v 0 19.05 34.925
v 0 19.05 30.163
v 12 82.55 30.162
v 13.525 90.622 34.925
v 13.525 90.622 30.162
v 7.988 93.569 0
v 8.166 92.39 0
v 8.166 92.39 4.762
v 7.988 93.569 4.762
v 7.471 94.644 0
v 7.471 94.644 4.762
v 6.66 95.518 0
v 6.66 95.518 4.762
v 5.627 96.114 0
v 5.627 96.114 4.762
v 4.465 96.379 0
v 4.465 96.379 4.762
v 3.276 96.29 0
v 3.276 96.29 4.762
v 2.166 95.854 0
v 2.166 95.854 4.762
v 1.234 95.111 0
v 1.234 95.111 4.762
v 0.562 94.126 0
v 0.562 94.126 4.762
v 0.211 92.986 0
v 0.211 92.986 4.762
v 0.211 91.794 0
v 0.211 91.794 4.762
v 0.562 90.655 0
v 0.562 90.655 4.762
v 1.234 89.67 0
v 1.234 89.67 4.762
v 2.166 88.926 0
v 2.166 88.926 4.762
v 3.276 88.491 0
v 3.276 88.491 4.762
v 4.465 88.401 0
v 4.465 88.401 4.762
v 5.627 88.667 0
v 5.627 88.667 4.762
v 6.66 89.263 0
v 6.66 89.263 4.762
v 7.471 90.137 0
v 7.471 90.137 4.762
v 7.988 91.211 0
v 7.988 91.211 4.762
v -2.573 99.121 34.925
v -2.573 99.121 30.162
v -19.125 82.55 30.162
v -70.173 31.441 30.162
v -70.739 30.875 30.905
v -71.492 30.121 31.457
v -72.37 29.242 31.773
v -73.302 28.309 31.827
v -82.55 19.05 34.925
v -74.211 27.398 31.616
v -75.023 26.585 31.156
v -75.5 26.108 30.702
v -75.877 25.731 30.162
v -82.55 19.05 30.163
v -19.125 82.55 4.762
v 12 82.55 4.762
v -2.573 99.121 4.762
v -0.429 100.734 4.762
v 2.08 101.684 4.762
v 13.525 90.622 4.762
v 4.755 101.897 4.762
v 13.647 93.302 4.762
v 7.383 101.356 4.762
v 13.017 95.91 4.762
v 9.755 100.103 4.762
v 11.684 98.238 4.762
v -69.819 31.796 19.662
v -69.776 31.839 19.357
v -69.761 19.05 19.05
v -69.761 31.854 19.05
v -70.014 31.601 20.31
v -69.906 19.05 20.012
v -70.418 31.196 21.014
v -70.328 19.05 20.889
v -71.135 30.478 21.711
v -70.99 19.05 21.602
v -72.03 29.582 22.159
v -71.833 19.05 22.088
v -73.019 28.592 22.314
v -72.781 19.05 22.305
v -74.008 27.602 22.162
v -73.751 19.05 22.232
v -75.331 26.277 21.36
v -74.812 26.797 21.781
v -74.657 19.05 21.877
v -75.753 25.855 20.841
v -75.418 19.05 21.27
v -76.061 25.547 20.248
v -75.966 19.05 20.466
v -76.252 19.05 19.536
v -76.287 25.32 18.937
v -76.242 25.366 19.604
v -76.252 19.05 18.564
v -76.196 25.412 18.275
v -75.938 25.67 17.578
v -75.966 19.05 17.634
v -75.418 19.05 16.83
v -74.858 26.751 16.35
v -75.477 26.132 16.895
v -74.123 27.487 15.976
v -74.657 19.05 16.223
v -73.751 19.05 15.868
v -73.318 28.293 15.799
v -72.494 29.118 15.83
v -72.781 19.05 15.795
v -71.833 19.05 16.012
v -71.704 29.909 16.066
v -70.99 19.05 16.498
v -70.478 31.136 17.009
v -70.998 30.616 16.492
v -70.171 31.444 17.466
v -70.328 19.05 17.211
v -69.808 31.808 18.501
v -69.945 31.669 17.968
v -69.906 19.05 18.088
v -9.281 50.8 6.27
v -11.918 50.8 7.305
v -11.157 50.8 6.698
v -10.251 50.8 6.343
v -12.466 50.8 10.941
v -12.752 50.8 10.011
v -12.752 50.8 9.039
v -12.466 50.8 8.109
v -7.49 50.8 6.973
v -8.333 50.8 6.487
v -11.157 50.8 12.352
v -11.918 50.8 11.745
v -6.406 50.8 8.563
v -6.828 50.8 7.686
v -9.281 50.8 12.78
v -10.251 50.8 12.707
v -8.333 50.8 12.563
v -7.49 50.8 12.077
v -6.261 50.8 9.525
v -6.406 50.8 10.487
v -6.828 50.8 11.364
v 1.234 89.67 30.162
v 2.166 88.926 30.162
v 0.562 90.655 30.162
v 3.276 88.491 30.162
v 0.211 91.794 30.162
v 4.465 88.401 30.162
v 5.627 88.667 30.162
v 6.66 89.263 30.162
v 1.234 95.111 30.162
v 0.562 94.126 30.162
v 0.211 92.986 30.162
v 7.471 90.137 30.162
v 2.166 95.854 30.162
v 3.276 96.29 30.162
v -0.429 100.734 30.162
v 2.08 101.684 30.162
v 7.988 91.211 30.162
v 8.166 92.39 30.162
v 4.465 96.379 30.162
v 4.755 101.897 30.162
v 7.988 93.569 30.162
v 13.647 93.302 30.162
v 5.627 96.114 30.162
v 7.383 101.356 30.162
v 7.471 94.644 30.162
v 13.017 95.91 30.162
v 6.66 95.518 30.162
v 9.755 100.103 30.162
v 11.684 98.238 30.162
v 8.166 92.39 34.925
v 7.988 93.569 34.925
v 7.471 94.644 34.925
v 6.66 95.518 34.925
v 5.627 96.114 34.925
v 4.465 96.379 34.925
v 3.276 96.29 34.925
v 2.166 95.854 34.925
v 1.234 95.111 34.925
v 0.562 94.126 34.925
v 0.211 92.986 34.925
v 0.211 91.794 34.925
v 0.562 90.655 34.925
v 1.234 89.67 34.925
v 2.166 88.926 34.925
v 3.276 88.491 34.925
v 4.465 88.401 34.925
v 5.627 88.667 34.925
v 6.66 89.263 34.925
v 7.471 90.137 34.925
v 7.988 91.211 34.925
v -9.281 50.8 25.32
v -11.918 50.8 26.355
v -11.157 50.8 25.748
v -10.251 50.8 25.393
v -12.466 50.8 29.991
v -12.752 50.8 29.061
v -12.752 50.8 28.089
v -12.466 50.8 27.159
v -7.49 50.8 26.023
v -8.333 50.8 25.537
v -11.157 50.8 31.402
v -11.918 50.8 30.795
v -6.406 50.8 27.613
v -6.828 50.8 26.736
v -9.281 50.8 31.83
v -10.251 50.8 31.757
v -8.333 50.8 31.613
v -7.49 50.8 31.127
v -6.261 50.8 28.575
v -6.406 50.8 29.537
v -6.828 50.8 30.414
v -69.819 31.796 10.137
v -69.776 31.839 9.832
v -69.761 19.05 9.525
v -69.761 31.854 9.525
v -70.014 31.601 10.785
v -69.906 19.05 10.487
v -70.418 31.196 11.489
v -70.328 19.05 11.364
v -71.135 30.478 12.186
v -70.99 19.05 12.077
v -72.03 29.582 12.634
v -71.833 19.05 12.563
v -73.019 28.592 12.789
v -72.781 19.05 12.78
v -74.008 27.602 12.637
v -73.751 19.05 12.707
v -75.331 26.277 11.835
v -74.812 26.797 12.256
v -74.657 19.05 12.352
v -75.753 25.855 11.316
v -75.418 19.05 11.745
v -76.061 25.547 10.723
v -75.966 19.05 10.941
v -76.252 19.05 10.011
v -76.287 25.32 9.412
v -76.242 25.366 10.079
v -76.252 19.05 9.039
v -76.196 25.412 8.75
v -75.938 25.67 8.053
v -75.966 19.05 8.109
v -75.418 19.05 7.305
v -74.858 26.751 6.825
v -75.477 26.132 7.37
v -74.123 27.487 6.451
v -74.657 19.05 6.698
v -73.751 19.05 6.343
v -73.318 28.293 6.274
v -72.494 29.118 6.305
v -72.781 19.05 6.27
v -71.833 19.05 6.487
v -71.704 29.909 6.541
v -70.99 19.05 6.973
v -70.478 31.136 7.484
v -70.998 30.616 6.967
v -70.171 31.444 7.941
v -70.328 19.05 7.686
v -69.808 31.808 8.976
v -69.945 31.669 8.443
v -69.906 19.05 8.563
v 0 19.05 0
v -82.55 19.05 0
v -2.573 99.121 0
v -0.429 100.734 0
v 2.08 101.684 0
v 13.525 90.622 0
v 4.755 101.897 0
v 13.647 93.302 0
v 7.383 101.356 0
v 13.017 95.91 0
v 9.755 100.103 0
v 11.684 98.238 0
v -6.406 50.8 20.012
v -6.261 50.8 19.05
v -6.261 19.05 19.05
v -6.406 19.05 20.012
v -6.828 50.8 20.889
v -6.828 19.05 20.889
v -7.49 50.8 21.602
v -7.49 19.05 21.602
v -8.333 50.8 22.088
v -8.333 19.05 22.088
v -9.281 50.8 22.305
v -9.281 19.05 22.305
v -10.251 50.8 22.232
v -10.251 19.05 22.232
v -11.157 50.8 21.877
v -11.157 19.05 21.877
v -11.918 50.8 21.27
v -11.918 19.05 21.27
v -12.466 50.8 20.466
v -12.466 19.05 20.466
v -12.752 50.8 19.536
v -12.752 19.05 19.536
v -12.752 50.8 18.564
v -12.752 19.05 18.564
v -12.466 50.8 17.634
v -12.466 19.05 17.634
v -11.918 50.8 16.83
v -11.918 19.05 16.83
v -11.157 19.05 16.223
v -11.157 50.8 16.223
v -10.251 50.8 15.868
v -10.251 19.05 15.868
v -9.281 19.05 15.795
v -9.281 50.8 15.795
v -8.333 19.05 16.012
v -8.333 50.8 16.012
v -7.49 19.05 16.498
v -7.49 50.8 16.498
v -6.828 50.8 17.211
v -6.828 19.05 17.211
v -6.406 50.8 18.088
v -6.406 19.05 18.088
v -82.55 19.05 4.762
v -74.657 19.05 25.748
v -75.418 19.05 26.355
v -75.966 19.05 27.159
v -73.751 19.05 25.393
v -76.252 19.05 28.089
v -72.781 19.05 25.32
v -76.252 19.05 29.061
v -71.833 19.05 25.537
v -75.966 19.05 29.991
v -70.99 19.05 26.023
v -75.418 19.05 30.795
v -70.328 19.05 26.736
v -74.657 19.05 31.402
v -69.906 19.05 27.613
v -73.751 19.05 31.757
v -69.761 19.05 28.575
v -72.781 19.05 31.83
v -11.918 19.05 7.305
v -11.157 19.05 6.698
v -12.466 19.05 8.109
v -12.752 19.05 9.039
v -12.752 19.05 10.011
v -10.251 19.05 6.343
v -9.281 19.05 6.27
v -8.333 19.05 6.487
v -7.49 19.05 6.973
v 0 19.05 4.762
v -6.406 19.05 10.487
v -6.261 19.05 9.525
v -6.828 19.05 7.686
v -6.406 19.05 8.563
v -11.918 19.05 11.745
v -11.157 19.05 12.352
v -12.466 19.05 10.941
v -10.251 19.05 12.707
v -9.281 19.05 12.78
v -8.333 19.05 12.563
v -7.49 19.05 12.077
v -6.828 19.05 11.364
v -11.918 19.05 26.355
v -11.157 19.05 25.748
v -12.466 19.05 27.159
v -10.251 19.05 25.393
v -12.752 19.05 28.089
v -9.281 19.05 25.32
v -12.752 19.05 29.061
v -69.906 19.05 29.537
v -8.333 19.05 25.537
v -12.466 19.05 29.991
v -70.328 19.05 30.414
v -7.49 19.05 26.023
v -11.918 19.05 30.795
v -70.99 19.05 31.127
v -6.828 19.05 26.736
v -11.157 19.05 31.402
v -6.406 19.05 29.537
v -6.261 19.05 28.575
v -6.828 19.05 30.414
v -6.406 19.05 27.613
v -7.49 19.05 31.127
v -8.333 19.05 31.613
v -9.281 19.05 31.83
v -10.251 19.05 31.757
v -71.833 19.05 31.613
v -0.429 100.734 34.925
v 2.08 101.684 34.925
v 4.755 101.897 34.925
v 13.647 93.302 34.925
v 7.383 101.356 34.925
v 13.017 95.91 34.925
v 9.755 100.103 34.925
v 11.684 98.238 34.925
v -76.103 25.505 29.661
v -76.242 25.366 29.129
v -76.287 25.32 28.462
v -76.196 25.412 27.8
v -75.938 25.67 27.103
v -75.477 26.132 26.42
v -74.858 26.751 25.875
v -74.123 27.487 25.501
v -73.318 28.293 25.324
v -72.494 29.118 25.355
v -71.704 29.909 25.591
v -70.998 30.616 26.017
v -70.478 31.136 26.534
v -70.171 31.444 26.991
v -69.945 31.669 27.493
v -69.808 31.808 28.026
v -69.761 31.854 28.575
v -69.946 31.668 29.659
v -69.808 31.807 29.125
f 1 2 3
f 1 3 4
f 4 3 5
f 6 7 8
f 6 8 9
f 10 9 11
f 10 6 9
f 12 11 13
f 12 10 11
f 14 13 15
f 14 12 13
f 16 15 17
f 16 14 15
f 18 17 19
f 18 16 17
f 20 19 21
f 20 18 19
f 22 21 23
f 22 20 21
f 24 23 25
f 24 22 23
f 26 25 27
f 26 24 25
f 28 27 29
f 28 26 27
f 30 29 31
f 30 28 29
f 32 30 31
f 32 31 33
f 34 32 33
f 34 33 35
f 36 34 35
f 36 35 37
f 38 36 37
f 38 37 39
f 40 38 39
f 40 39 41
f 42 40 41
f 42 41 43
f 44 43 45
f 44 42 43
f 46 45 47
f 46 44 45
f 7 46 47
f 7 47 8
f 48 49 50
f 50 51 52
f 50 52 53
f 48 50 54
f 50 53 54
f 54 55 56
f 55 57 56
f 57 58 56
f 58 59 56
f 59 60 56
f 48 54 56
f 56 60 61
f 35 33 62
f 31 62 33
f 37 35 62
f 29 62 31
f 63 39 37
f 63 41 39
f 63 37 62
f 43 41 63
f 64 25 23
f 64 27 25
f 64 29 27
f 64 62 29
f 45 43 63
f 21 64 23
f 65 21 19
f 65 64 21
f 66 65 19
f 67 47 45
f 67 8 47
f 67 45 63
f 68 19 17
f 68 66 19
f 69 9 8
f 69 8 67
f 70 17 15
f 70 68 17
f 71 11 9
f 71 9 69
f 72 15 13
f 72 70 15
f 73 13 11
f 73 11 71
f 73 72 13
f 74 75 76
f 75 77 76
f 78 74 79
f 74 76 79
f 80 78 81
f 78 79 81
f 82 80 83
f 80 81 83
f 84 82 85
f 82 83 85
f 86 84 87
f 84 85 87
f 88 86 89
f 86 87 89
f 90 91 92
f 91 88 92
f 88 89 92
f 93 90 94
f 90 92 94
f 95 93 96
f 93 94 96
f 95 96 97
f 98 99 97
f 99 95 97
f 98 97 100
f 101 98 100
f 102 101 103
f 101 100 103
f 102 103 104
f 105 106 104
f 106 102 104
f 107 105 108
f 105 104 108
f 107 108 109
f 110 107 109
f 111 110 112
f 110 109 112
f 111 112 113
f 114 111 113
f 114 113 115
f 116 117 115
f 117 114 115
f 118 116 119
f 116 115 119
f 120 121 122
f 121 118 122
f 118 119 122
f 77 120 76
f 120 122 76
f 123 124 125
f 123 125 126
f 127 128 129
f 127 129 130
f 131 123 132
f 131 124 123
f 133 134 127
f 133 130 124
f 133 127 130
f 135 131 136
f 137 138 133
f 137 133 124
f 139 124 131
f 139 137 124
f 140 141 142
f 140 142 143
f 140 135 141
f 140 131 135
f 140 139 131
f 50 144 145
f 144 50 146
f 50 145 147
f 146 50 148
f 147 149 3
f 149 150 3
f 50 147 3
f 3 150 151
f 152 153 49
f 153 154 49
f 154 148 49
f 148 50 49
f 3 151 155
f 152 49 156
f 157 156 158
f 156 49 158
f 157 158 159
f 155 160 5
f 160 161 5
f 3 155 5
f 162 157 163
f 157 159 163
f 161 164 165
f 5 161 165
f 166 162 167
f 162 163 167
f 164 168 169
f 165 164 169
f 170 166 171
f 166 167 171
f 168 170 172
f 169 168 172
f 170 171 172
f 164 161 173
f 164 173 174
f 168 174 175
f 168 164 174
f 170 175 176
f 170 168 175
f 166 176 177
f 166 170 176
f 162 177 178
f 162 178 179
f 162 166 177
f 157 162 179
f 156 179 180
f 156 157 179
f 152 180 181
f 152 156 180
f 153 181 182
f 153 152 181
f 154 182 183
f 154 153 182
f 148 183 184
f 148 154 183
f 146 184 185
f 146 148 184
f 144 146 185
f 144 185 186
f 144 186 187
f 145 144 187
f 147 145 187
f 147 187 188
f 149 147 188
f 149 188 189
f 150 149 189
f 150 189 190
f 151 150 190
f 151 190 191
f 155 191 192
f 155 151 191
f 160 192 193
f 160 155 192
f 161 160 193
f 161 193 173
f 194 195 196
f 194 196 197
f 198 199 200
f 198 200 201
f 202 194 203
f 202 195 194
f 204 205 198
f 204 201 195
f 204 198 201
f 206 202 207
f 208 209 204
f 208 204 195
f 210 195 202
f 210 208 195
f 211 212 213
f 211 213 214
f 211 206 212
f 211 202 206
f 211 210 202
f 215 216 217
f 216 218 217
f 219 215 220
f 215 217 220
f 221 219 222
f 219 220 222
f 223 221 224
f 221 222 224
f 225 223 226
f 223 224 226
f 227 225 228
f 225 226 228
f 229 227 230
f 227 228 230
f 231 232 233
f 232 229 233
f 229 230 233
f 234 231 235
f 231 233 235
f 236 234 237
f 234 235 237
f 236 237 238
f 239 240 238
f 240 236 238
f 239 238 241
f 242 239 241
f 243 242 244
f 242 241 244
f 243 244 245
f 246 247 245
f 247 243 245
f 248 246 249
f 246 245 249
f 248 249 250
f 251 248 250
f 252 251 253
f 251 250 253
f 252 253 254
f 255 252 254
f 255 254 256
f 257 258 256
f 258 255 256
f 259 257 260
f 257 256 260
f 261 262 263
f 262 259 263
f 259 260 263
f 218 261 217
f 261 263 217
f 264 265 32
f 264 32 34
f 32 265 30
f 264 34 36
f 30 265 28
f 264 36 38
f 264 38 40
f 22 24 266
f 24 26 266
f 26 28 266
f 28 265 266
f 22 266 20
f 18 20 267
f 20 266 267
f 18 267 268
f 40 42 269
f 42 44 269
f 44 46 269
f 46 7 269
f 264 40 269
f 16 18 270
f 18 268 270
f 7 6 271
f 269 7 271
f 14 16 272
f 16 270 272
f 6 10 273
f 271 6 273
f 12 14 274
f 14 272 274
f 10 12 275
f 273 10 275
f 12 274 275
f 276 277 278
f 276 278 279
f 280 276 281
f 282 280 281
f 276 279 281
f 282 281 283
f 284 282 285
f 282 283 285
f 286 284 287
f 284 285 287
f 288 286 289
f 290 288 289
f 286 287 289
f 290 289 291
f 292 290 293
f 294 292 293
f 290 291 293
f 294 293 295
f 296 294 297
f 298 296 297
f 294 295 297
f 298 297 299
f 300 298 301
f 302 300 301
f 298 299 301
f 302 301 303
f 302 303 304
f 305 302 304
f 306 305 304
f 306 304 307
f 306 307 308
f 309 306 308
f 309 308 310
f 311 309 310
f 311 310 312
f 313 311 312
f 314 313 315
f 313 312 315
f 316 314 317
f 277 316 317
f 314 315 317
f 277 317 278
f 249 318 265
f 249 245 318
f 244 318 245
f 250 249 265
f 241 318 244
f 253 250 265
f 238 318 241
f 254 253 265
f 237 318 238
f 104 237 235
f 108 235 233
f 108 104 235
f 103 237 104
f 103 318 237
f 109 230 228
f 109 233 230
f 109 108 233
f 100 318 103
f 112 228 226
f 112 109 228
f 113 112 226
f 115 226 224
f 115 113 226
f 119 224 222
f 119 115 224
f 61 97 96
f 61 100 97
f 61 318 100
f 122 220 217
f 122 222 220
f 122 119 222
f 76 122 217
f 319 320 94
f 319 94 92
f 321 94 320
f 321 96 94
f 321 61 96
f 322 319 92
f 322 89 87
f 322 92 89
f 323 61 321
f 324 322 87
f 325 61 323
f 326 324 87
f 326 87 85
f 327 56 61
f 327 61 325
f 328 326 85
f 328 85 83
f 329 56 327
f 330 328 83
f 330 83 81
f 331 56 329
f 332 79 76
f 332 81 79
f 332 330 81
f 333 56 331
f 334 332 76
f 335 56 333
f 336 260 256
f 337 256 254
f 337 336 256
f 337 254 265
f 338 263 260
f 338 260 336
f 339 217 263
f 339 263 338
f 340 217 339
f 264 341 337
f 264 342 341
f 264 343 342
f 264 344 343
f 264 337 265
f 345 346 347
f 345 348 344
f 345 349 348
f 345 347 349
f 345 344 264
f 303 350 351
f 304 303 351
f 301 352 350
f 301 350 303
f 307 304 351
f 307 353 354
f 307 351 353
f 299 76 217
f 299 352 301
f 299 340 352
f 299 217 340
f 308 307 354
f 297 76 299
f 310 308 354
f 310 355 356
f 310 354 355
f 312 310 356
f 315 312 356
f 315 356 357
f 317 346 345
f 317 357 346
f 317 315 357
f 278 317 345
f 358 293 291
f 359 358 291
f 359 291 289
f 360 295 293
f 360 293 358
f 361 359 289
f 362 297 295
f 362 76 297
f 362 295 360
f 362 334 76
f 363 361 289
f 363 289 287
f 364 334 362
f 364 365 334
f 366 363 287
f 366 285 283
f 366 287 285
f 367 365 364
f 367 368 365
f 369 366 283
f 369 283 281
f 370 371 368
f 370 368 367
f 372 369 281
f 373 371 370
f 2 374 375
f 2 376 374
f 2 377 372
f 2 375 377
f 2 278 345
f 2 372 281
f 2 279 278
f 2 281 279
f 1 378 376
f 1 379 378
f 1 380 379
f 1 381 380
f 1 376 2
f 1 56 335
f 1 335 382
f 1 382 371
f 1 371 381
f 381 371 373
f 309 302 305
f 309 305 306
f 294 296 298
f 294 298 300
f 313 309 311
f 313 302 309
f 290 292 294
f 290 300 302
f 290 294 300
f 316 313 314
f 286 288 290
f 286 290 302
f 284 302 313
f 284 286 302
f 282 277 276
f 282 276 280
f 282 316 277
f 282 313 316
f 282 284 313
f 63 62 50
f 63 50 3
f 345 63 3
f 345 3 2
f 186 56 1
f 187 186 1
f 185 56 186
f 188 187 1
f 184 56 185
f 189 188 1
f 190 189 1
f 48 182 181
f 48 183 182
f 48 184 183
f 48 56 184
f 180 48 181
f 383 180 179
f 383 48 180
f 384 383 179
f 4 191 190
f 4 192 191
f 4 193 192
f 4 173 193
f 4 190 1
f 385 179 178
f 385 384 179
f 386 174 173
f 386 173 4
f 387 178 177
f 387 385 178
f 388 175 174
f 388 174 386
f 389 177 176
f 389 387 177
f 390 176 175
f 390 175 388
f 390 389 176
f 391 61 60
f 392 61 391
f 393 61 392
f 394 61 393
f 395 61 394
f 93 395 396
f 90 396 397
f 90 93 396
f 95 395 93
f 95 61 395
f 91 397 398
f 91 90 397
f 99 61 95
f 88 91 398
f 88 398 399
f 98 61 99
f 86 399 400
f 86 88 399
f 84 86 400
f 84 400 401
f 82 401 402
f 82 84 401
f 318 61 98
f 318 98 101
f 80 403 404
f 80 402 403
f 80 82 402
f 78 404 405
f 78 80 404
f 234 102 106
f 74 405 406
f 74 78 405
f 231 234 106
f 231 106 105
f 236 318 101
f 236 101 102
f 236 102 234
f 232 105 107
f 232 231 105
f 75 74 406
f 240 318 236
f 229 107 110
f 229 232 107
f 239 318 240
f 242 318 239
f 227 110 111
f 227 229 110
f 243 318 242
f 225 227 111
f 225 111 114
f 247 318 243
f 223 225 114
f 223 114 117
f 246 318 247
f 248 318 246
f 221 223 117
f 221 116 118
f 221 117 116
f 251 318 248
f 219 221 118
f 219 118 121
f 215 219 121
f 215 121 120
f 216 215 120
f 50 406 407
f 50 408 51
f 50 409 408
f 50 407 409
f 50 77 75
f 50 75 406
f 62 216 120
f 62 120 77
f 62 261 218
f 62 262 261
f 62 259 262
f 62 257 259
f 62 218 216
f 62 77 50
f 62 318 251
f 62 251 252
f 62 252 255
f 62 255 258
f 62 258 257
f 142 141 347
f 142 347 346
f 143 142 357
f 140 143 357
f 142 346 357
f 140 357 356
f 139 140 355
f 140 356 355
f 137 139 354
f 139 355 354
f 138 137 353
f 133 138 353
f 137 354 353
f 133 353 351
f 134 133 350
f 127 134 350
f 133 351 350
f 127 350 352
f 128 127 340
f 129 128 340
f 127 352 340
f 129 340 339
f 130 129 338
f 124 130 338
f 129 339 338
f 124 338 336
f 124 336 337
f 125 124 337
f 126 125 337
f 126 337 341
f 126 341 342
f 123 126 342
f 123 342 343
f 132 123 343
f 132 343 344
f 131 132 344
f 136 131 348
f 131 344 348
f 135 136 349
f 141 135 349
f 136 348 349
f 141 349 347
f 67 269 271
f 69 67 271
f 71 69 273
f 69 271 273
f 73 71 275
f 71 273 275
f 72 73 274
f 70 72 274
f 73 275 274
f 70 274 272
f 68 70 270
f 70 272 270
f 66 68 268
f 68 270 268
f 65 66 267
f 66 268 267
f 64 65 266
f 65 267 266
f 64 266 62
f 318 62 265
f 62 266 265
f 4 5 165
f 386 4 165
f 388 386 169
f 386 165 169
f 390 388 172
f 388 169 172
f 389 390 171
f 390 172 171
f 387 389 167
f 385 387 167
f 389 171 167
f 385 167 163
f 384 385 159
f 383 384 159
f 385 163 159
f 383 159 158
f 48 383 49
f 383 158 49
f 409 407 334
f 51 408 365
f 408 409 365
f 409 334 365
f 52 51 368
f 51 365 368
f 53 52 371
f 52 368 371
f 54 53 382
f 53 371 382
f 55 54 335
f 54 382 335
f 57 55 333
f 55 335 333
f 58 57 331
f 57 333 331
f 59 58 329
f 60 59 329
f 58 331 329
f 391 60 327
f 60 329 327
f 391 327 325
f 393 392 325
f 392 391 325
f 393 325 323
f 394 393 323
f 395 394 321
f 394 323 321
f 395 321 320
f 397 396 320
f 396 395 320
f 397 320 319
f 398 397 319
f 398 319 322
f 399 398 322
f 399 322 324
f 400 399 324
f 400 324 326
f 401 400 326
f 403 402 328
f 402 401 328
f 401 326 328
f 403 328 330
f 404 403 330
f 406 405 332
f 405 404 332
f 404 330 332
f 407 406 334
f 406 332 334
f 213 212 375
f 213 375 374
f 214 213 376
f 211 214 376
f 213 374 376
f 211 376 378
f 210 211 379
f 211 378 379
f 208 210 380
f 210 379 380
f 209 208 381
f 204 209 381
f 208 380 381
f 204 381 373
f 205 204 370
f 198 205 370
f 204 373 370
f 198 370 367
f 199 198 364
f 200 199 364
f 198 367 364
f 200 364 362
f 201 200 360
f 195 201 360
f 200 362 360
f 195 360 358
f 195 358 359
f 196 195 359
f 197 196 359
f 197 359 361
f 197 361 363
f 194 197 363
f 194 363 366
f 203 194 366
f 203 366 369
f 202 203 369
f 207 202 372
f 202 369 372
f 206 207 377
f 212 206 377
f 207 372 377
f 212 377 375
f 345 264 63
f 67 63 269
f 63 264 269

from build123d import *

# Parameters (mm, degrees)
SKETCH1_R           = 4
BOSS_EXTRUDE1_DEPTH = 4.7625
SKETCH2_R           = 4
BOSS_EXTRUDE2_DEPTH = 25.4
BOSS_EXTRUDE3_START = 30.1625
SKETCH1_2_R         = 4
BOSS_EXTRUDE3_DEPTH = 4.7625
SKETCH4_W           = 82.55
SKETCH4_H           = 34.925
CUT_EXTRUDE1_DEPTH  = 19.05
SKETCH5_R           = 3.2639
CUT_EXTRUDE2_DEPTH  = 31.75


with BuildPart() as part:
    # Sketch1 → Boss-Extrude1 (new body)
    with BuildSketch(Plane.XY):
        with BuildLine():
            Line((0, 0), (0, 19.05))
            Line((0, 19.05), (13.525460699, 90.621522374))
            ThreePointArc((13.525460699, 90.621522374), (8.613422955, 100.813245135), (-2.573048888, 99.121448653))
            Line((-2.573048888, 99.121448653), (-82.55, 19.05))
            Line((-82.55, 19.05), (-82.55, 0))
            Line((-82.55, 0), (0, 0))
        make_face()
        with Locations((4.166118695, 92.390234401)):
            Circle(SKETCH1_R, mode=Mode.SUBTRACT)
        with Locations((-9.525, 9.525)):
            Circle(SKETCH1_R, mode=Mode.SUBTRACT)
        with Locations((-73.025, 9.525)):
            Circle(SKETCH1_R, mode=Mode.SUBTRACT)
    extrude(amount=BOSS_EXTRUDE1_DEPTH)

    # Sketch2 → Boss-Extrude2 (add)
    with BuildSketch(Plane.XY.offset(4.7625)):
        Polygon((-19.124940493, 82.55), (12.000118566, 82.55), (0, 19.05), (0, 0), (-82.55, 0), (-82.55, 19.05), align=None)
        with Locations((-73.025, 9.525)):
            Circle(SKETCH2_R, mode=Mode.SUBTRACT)
        with Locations((-9.525, 9.525)):
            Circle(SKETCH2_R, mode=Mode.SUBTRACT)
    extrude(amount=BOSS_EXTRUDE2_DEPTH)

    # Sketch1<2> → Boss-Extrude3 (add)
    with BuildSketch(Plane.XY.offset(BOSS_EXTRUDE3_START)):
        with BuildLine():
            Line((0, 0), (0, 19.05))
            Line((0, 19.05), (13.525460699, 90.621522374))
            ThreePointArc((13.525460699, 90.621522374), (8.613422955, 100.813245135), (-2.573048888, 99.121448653))
            Line((-2.573048888, 99.121448653), (-82.55, 19.05))
            Line((-82.55, 19.05), (-82.55, 0))
            Line((-82.55, 0), (0, 0))
        make_face()
        with Locations((4.166118695, 92.390234401)):
            Circle(SKETCH1_2_R, mode=Mode.SUBTRACT)
        with Locations((-9.525, 9.525)):
            Circle(SKETCH1_2_R, mode=Mode.SUBTRACT)
        with Locations((-73.025, 9.525)):
            Circle(SKETCH1_2_R, mode=Mode.SUBTRACT)
    extrude(amount=BOSS_EXTRUDE3_DEPTH)

    # Sketch4 → Cut-Extrude1 (cut)
    with BuildSketch(Plane.XZ):
        with Locations((-41.275, 17.4625)):
            Rectangle(SKETCH4_W, SKETCH4_H)
    extrude(amount=-CUT_EXTRUDE1_DEPTH, mode=Mode.SUBTRACT)

    # Sketch5 → Cut-Extrude2 (cut)
    with BuildSketch(Plane.XZ.offset(-19.05)):
        with Locations((-9.525, 9.525)):
            Circle(SKETCH5_R)
        with Locations((-73.025, 9.525)):
            Circle(SKETCH5_R)
        with Locations((-73.025, 28.575)):
            Circle(SKETCH5_R)
        with Locations((-9.525, 28.575)):
            Circle(SKETCH5_R)
        with Locations((-73.025, 19.05)):
            Circle(SKETCH5_R)
        with Locations((-9.525, 19.05)):
            Circle(SKETCH5_R)
    extrude(amount=-CUT_EXTRUDE2_DEPTH, mode=Mode.SUBTRACT)


solid = part.part
